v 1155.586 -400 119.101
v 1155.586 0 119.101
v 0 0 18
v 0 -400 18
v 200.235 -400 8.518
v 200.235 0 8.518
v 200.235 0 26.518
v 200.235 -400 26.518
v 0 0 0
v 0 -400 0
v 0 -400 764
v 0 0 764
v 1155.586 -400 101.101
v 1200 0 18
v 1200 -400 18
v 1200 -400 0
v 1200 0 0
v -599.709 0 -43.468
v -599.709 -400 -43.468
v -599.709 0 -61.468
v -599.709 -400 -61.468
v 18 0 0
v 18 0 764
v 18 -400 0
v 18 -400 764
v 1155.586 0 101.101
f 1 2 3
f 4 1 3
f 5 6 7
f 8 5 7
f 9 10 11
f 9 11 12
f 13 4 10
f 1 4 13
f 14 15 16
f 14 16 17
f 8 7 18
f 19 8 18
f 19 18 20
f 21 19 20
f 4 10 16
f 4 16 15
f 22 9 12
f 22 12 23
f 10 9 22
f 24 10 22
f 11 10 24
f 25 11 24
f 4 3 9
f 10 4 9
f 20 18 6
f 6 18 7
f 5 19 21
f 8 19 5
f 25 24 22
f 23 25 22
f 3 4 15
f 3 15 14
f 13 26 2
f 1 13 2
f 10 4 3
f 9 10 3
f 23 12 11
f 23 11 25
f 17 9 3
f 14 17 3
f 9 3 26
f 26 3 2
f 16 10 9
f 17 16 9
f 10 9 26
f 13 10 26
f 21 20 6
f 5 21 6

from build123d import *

# Parameters (mm, degrees)
F0_W     = 18
F0_H     = 400
F1_DEPTH = 764
F3_DEPTH = 400
F4_W     = 400
F4_H     = 18
F5_DEPTH = 1200
F7_DEPTH = 400


with BuildPart() as f1:
    # F0 (on Top) → F1 (new body)
    with BuildSketch(Plane.XY):
        with Locations((9, -200)):
            Rectangle(F0_W, F0_H)
    extrude(amount=F1_DEPTH)


with BuildPart() as f3:
    # F2 (on Front) → F3 (new body)
    with BuildSketch(Plane.XZ):
        Polygon((0, 18), (0, 0), (1155.58585, 101.100662), (1155.58585, 119.100662), align=None)
    extrude(amount=F3_DEPTH)


with BuildPart() as f5:
    # F4 (on Right) → F5 (new body)
    with BuildSketch(Plane.YZ):
        with Locations((-200, 9)):
            Rectangle(F4_W, F4_H)
    extrude(amount=F5_DEPTH)


with BuildPart() as f7:
    # F6 (on Front) → F7 (new body)
    with BuildSketch(Plane.XZ):
        Polygon((-599.709208, -43.467757), (-599.709208, -61.467757), (200.235134, 8.518304), (200.235134, 26.518304), align=None)
    extrude(amount=F7_DEPTH)


solid = Compound([f1.part, f3.part, f5.part, f7.part])
